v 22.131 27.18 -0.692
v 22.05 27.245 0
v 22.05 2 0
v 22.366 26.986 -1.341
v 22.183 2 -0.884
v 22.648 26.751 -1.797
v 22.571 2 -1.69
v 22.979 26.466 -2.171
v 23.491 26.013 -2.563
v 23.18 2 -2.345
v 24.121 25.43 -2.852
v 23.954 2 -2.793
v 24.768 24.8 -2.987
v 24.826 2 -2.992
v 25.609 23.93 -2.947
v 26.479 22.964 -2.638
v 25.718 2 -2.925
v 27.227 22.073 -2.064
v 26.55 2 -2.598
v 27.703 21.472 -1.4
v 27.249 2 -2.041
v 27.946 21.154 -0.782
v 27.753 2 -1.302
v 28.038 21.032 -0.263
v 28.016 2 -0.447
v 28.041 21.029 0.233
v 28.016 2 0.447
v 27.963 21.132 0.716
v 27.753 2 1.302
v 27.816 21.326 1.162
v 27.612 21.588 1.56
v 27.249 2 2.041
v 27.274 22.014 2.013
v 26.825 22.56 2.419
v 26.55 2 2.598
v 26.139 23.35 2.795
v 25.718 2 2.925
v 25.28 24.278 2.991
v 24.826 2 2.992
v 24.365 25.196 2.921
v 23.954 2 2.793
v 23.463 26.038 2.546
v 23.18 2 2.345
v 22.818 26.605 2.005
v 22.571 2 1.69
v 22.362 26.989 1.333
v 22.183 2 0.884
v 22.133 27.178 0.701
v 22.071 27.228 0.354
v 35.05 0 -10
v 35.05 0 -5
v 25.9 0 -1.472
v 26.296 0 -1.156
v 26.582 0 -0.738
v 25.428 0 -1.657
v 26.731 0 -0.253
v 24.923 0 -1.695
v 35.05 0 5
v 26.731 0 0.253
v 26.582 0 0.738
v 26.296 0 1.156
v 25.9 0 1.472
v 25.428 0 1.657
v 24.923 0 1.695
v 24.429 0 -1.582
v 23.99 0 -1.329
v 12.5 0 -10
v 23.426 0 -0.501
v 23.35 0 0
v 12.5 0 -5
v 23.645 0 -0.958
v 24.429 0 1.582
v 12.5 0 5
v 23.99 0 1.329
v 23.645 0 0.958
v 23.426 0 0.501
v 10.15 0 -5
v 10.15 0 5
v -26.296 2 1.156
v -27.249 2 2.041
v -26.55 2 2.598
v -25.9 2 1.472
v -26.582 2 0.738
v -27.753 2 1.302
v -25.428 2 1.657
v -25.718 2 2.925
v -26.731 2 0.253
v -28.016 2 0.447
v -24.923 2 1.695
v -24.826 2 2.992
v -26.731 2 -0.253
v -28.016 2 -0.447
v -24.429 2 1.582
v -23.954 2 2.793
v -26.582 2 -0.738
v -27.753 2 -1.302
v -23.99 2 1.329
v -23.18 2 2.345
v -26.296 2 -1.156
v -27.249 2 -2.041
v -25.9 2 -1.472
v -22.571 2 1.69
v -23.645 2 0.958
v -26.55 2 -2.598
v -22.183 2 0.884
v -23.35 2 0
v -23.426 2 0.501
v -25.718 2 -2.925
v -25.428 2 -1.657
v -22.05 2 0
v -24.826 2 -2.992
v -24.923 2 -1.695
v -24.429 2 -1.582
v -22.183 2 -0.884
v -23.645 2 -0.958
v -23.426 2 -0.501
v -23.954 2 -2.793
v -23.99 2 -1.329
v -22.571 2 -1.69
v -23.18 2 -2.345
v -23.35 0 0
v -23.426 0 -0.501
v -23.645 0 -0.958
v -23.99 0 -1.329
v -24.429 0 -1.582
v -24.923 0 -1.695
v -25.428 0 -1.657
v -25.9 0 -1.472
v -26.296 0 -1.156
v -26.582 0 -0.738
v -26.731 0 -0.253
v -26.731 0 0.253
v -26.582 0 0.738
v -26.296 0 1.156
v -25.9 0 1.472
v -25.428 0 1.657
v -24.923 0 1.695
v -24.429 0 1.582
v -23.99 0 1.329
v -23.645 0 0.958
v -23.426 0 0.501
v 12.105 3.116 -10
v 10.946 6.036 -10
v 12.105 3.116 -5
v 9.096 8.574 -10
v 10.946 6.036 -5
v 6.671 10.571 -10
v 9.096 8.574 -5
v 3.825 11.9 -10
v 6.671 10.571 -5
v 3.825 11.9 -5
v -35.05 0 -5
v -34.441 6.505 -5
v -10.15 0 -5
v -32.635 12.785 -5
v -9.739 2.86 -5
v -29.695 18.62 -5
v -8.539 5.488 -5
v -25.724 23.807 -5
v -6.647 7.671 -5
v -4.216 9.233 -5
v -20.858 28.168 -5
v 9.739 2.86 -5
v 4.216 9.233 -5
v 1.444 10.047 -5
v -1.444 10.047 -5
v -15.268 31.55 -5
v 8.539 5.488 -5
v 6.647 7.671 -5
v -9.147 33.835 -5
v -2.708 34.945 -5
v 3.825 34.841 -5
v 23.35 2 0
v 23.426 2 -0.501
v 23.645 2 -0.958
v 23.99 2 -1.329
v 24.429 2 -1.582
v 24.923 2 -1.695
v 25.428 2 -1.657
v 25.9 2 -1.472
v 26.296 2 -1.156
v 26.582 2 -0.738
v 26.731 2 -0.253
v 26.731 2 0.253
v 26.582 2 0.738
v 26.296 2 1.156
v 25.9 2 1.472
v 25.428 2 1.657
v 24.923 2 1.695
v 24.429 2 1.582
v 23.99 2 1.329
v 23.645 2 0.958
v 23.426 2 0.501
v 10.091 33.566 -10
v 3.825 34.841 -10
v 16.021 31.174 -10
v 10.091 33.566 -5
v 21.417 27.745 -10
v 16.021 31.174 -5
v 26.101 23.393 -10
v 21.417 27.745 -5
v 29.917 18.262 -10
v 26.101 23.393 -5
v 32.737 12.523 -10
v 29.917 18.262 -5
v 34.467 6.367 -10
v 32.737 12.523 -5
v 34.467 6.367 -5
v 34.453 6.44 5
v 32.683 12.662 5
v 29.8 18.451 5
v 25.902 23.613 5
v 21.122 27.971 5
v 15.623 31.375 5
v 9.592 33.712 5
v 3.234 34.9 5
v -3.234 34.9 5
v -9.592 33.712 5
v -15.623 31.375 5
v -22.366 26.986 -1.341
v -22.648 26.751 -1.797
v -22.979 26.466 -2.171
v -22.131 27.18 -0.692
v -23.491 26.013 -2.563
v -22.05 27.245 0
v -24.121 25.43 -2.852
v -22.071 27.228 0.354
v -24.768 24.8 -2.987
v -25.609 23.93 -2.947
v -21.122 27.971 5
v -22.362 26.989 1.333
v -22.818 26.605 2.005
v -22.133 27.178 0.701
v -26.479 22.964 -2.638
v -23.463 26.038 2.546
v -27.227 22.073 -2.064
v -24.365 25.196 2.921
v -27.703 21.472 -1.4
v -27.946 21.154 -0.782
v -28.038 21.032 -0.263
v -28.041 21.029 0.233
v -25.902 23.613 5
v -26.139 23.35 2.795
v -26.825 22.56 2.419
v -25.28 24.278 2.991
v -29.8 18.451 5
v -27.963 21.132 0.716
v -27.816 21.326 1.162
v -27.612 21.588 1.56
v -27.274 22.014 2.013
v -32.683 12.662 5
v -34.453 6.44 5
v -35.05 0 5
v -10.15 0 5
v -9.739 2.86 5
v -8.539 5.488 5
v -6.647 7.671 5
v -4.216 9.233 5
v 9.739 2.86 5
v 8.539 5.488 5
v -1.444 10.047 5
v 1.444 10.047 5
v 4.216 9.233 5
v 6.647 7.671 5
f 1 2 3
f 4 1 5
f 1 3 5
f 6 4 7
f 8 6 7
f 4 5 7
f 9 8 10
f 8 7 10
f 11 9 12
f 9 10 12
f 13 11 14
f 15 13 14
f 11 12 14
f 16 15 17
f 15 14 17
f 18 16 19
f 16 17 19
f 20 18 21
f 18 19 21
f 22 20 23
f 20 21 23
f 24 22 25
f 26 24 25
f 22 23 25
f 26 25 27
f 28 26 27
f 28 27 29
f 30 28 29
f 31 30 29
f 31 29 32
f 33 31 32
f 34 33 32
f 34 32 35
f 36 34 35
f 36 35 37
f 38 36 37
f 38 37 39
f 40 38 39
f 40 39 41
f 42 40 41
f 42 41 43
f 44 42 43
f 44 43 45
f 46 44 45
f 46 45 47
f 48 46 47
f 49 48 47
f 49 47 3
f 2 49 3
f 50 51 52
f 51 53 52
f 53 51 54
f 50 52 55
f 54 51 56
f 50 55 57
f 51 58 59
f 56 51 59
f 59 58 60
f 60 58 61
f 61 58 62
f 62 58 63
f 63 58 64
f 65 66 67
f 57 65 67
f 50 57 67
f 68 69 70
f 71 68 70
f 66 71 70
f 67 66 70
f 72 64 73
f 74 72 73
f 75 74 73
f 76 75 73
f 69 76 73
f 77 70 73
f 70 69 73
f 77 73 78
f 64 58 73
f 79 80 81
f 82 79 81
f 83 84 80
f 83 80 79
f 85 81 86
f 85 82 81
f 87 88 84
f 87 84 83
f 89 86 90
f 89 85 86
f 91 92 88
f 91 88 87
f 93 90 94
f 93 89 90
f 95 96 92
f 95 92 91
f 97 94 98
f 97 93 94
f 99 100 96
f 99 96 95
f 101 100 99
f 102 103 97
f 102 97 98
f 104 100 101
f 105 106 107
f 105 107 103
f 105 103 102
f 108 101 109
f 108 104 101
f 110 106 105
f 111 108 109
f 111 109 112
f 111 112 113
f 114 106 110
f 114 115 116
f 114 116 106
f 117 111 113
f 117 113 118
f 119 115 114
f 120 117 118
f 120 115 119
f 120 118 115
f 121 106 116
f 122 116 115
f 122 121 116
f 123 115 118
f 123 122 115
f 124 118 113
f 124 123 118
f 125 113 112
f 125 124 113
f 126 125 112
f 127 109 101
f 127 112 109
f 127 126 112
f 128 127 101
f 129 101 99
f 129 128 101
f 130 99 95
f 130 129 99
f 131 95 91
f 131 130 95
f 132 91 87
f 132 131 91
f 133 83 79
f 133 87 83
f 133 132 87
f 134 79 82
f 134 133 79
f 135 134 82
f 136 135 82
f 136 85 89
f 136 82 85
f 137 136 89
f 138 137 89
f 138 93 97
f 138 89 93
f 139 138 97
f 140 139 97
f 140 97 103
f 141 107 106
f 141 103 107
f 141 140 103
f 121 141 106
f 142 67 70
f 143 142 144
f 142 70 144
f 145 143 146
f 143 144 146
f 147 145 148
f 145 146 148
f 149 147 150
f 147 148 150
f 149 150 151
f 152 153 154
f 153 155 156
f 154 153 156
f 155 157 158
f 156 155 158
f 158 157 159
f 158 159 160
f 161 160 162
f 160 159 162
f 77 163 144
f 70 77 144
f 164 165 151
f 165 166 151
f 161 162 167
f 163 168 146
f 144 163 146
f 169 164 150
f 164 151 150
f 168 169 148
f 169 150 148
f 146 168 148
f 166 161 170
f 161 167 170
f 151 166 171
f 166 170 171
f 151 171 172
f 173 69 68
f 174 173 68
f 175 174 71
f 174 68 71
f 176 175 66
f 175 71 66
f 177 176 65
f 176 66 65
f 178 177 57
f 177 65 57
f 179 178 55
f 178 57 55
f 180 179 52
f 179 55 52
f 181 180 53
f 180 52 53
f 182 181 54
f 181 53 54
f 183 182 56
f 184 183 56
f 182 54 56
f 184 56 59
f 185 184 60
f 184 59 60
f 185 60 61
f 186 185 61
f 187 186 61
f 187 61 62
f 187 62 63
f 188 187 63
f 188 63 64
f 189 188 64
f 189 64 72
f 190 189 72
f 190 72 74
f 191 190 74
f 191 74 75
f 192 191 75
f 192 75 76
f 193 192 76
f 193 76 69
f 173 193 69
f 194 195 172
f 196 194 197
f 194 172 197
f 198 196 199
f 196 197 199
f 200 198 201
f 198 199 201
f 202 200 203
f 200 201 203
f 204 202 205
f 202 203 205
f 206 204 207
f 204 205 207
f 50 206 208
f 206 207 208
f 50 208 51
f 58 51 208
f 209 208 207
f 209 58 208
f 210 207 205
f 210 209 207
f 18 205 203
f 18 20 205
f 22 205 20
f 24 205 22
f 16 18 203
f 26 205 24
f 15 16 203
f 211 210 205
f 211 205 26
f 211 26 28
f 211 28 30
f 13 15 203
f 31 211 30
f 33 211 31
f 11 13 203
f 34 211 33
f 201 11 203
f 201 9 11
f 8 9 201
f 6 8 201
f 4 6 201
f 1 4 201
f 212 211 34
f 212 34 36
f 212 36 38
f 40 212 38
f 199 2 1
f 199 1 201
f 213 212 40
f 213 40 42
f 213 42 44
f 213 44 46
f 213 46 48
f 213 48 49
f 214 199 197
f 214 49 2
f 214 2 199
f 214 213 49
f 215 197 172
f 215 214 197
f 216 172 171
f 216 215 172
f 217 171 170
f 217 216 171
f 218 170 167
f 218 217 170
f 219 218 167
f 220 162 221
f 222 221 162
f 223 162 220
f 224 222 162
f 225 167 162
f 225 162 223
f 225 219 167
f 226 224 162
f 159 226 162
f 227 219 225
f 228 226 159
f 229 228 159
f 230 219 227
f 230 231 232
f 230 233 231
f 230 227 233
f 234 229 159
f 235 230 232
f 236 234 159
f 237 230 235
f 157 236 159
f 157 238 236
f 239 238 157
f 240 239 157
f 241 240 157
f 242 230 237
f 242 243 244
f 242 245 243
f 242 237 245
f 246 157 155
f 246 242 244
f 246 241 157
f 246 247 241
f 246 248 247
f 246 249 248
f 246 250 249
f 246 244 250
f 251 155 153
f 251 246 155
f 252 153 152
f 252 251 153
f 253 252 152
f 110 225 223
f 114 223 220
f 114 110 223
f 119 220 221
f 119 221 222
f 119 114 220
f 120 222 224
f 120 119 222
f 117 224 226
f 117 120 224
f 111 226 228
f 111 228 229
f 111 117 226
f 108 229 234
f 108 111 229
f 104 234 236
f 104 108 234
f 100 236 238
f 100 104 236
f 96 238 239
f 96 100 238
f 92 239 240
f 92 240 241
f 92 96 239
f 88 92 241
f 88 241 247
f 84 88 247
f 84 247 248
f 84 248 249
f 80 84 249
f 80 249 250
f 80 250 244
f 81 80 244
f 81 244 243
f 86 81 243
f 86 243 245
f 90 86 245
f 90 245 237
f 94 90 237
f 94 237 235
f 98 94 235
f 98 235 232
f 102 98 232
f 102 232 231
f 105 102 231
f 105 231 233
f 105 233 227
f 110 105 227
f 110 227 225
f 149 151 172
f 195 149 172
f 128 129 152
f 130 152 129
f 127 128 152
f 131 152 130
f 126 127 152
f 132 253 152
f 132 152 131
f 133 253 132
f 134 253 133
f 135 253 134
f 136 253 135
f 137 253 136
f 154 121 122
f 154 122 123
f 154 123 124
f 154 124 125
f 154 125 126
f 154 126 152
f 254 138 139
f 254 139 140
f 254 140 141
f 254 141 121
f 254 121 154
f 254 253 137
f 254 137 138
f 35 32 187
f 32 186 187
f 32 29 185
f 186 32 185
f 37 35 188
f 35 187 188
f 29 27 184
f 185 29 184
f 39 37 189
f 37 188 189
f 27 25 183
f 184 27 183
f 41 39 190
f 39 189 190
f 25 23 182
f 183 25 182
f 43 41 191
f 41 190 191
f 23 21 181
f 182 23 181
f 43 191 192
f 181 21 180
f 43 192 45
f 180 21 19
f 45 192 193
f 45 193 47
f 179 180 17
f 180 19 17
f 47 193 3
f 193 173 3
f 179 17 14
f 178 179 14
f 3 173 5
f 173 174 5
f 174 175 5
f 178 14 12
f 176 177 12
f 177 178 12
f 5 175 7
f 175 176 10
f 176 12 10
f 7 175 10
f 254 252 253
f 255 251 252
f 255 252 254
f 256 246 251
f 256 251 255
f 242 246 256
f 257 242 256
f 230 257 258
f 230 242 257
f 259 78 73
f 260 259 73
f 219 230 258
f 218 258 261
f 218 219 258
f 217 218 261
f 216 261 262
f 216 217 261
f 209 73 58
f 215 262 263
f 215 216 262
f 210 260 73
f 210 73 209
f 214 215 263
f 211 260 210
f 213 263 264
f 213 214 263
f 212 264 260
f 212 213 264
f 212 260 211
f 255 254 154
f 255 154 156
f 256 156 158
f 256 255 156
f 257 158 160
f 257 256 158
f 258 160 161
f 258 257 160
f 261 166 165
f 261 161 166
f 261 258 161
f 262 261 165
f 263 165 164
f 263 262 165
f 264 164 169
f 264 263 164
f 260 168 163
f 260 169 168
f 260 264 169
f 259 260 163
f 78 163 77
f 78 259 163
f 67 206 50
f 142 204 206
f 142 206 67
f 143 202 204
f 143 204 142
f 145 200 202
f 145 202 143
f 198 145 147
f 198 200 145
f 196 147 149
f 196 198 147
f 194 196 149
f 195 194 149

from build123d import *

# Parameters (mm, degrees)
BOSS_EXTRUDE1_DEPTH = 5
SKETCH2_R           = 1.7
CUT_EXTRUDE1_DEPTH  = 36.05
CUT_EXTRUDE2_START  = 2
SKETCH3_R           = 3
CUT_EXTRUDE2_DEPTH  = 34.0500001
BOSS_EXTRUDE2_DEPTH = 5
SKETCH5_W           = 3.825
SKETCH5_H           = 24.9
CUT_EXTRUDE3_DEPTH  = 6
SKETCH6_W           = 5
SKETCH6_H           = 34.840664101
CUT_EXTRUDE4_DEPTH  = 32.2250001


with BuildPart() as part:
    # Sketch1 → Boss-Extrude1 (new body, symmetric)
    with BuildSketch(Plane.XY):
        with BuildLine():
            Line((-35.05, 0), (-10.15, 0))
            ThreePointArc((-10.15, 0), (0, 10.15), (10.15, 0))
            Line((10.15, 0), (35.05, 0))
            ThreePointArc((35.05, 0), (0, 35.05), (-35.05, 0))
        make_face()
    extrude(amount=BOSS_EXTRUDE1_DEPTH, both=True)

    # Sketch2 → Cut-Extrude1 (cut, through all)
    with BuildSketch(Plane(origin=(0, 0, 0), x_dir=(1, 0, 0), z_dir=(0, 1, 0))):
        with Locations((-25.05, 0)):
            Circle(SKETCH2_R)
    cut_extrude1 = extrude(amount=CUT_EXTRUDE1_DEPTH, mode=Mode.SUBTRACT)

    # Sketch3 → Cut-Extrude2 (cut, through all)
    with BuildSketch(Plane(origin=(0, 0, 0), x_dir=(1, 0, 0), z_dir=(0, 1, 0)).offset(CUT_EXTRUDE2_START)):
        with Locations((-25.05, 0)):
            Circle(SKETCH3_R)
    cut_extrude2 = extrude(amount=CUT_EXTRUDE2_DEPTH, mode=Mode.SUBTRACT)

    # Mirror1: Cut-Extrude1, Cut-Extrude2 across plane
    add(cut_extrude1.mirror(Plane(origin=(0, 0, 0), x_dir=(0, 0, 1), z_dir=(1, 0, 0))), mode=Mode.SUBTRACT)
    add(cut_extrude2.mirror(Plane(origin=(0, 0, 0), x_dir=(0, 0, 1), z_dir=(1, 0, 0))), mode=Mode.SUBTRACT)

    # Sketch4 → Boss-Extrude2 (add)
    with BuildSketch(Plane.XY.offset(5)):
        with BuildLine():
            Line((0, 12.5), (0, 35.05))
            ThreePointArc((0, 35.05), (24.784092681, 24.784092681), (35.05, 0))
            Line((35.05, 0), (12.5, 0))
            ThreePointArc((12.5, 0), (8.838834765, 8.838834765), (0, 12.5))
        make_face()
    boss_extrude2 = extrude(amount=BOSS_EXTRUDE2_DEPTH)

    # Sketch5 → Cut-Extrude3 (cut, through all)
    with BuildSketch(Plane.XY.offset(5)):
        with Locations((1.9125, 22.6)):
            Rectangle(SKETCH5_W, SKETCH5_H)
    cut_extrude3 = extrude(amount=CUT_EXTRUDE3_DEPTH, mode=Mode.SUBTRACT)

    # Mirror2: Boss-Extrude2, Cut-Extrude3 across plane
    add(boss_extrude2.mirror(Plane.XY))
    add(cut_extrude3.mirror(Plane.XY), mode=Mode.SUBTRACT)

    # Sketch6 → Cut-Extrude4 (cut, through all)
    with BuildSketch(Plane.ZY.offset(-3.825)):
        with Locations((7.5, 17.420332051)):
            Rectangle(SKETCH6_W, SKETCH6_H)
    extrude(amount=-CUT_EXTRUDE4_DEPTH, mode=Mode.SUBTRACT)


solid = part.part
